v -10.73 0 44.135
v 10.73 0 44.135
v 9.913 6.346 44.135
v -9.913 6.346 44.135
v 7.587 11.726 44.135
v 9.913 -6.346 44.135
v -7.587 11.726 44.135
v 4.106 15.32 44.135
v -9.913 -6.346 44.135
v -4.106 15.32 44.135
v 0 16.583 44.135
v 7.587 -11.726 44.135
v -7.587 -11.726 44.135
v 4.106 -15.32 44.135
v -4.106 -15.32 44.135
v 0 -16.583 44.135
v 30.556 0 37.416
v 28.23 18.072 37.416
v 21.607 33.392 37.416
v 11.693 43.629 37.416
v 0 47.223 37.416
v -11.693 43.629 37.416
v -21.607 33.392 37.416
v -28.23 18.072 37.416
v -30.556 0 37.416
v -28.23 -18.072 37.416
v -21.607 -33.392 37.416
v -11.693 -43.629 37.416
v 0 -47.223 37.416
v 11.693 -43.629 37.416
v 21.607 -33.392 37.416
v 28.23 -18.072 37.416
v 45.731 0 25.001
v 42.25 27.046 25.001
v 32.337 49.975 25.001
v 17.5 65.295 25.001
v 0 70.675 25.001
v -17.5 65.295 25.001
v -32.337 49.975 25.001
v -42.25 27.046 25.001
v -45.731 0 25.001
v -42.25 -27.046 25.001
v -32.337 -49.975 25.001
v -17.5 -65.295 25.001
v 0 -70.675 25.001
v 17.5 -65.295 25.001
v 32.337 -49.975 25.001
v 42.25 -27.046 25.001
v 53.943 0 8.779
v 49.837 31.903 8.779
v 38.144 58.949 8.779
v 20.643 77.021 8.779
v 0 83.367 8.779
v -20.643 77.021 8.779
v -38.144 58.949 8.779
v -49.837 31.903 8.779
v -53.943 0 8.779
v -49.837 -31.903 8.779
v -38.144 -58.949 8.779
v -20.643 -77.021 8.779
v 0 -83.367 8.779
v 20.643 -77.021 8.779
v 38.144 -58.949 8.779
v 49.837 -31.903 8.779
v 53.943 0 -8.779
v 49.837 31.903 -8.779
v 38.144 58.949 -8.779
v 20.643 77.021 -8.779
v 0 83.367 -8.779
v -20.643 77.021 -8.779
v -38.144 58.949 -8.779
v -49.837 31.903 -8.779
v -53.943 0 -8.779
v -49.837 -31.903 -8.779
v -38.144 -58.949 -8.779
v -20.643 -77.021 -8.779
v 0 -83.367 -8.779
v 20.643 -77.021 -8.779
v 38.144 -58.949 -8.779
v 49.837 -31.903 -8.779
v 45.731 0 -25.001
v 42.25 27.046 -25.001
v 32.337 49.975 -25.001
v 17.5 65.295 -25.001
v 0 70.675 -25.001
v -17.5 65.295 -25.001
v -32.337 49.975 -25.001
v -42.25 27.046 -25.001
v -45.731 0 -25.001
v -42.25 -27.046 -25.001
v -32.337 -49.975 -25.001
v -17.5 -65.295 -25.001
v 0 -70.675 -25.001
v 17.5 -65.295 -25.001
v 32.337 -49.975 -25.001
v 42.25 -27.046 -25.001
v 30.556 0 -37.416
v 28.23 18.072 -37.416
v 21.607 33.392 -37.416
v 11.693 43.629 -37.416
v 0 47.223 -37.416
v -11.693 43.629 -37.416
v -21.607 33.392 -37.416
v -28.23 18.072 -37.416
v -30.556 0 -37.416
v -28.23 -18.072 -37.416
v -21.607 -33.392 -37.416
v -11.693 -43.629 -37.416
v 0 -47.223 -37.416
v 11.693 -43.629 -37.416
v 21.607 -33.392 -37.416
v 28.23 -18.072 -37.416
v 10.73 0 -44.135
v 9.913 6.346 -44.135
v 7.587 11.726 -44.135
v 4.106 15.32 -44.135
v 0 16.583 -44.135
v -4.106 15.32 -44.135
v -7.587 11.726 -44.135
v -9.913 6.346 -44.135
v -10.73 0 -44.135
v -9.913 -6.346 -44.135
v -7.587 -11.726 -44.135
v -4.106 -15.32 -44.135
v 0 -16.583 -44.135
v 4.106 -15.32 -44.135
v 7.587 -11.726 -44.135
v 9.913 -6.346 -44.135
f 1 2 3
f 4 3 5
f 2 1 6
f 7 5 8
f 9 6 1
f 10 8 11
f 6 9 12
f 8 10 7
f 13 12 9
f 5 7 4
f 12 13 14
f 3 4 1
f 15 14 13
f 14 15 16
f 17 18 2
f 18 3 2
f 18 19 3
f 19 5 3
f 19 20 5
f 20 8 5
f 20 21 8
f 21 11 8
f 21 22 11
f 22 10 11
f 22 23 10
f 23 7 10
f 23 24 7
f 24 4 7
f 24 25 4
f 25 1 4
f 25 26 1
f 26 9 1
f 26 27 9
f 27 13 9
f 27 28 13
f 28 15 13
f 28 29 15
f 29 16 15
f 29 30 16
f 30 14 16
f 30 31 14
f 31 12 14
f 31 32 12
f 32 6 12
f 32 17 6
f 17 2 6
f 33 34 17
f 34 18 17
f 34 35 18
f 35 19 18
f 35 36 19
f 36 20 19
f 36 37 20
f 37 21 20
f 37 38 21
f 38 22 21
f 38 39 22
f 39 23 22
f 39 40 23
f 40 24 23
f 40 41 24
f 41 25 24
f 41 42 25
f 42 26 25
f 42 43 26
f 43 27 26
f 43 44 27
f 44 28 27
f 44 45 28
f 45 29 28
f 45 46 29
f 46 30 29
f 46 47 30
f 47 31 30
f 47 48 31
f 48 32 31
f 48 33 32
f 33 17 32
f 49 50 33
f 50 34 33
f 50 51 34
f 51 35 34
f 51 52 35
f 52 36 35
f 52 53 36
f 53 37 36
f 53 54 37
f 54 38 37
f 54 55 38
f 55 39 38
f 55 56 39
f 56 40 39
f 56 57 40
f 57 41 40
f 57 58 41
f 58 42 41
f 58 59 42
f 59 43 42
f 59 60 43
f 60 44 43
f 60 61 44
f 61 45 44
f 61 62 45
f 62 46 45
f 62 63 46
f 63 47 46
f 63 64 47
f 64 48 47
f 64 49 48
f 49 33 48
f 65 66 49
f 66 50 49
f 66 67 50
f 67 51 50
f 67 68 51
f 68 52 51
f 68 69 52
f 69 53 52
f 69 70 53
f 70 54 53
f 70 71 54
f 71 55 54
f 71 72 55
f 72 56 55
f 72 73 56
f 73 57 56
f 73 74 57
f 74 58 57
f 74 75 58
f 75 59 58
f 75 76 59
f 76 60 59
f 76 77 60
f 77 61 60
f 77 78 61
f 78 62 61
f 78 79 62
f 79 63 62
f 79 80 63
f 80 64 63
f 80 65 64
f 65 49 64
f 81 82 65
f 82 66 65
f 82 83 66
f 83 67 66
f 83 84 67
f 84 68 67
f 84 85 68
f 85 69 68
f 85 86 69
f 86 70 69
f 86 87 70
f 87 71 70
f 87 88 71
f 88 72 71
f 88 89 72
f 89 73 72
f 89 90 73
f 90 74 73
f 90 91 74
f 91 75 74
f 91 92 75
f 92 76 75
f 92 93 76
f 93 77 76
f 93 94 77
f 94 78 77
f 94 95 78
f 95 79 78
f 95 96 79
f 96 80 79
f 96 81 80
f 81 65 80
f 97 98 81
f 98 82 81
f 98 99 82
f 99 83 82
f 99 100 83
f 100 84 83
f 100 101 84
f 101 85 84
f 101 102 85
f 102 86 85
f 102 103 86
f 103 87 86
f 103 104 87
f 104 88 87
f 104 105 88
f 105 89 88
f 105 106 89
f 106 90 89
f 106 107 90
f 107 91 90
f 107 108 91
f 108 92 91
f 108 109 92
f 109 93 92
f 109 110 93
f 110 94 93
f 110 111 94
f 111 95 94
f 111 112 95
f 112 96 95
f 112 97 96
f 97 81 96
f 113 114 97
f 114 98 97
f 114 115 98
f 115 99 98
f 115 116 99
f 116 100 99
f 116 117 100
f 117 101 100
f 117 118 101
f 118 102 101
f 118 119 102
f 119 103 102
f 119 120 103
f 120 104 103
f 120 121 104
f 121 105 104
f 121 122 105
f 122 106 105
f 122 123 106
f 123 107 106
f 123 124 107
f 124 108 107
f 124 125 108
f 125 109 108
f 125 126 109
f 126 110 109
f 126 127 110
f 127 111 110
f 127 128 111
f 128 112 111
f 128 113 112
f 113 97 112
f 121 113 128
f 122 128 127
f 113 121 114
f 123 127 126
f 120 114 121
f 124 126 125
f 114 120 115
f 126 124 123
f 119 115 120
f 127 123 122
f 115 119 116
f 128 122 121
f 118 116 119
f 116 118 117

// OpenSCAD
// Generated by SolidPython 1.0.1 on 2020-07-29 00:46:50


scale(v = [11, 17, 9]) {
	sphere(r = 5);
}
/***********************************************
*********      SolidPython code:      **********
************************************************
 
# import packages: SolidPython
from solid import *
from solid.utils import *
from itertools import chain, combinations, permutations


class Resize:

    def __init__(self, scad_file):
        self.scad_file = scad_file
        #self.scad_file = import_scad(scad_file)
        # cone/cylinder param:
        self.r1 = 0
        self.r2 = 0
        self.h = 0
        # rectangular prism param:
        self.w = 0
        self.l = 0
        # ellipse param:
        self.r = 0

    # import OpenScad code (file name corresponds to shape)


    # classify shape + parameters
    def assign(self, param1, param2, param3):
        if self.scad_file == 'cone.scad':
            self.r1 = param1
            self.r2 = param2
            self.h = param3
        elif self.scad_file == 'cylinder.scad':
            self.r1 = param1
            self.r2 = param2
            self.h = param3
        elif self.scad_file == 'rectangularPrism.scad':
            self.h = param1
            self.l = param2
            self.w = param3
        else:
            self.r = param1
            self.h = param2

    # resize parameters
    def iterate(self):
        x = range(3, 20, 2)
        i = 1
        if self.scad_file == 'cone.scad':
            tempList = list(permutations(x, 2))
            for temp in tempList:
                param1 = temp[0]
                param2 = temp[1]
                filepath = 'produced_scad_files/' + 'cone' + str(param1) + '_' + str(param2) + '_' + '.scad'
                scad_render_to_file(cylinder(h=param1, r1=param2, r2=0), filepath)

        elif self.scad_file == 'cylinder.scad':
            tempList = list(permutations(x, 3))
            for temp in tempList:
                param1 = temp[0]
                param2 = temp[1]
                filepath = 'produced_scad_files/' + 'cylinder' + str(param1) + '_' + str(param2) + '_' + '.scad'
                scad_render_to_file(cylinder(h=param1, r1=param2, r2=param2), filepath)

        elif self.scad_file == 'rectangularPrism.scad':
            tempList = list(permutations(x, 3))
            for temp in tempList:
                param1 = temp[0]
                param2 = temp[1]
                param3 = temp[2]
                filepath = 'produced_scad_files/' + 'rectangularPrism' + str(param1) + '_' + str(param2) + '_' + str(
                    param3) + '.scad'
                scad_render_to_file(cube(size=(param1, param2, param3)), filepath)

        elif self.scad_file == 'ellipse.scad':
            tempList = list(permutations(x, 4))
            for temp in tempList:
                param1 = temp[0]
                param2 = temp[1]
                param3 = temp[2]
                param4 = temp[3]
                filepath = 'produced_scad_files/' + 'ellipse' + str(param1) + '_' + str(param2) + '_' + str(param3) + '_' + str(param4) + '.scad'
                scad_render_to_file(scale([param1, param2, param3])(sphere(r=param4)), filepath)

    def render_to_scadfile(self):
        scad_render_to_file(scad, 'example.scad') 
 
************************************************/
